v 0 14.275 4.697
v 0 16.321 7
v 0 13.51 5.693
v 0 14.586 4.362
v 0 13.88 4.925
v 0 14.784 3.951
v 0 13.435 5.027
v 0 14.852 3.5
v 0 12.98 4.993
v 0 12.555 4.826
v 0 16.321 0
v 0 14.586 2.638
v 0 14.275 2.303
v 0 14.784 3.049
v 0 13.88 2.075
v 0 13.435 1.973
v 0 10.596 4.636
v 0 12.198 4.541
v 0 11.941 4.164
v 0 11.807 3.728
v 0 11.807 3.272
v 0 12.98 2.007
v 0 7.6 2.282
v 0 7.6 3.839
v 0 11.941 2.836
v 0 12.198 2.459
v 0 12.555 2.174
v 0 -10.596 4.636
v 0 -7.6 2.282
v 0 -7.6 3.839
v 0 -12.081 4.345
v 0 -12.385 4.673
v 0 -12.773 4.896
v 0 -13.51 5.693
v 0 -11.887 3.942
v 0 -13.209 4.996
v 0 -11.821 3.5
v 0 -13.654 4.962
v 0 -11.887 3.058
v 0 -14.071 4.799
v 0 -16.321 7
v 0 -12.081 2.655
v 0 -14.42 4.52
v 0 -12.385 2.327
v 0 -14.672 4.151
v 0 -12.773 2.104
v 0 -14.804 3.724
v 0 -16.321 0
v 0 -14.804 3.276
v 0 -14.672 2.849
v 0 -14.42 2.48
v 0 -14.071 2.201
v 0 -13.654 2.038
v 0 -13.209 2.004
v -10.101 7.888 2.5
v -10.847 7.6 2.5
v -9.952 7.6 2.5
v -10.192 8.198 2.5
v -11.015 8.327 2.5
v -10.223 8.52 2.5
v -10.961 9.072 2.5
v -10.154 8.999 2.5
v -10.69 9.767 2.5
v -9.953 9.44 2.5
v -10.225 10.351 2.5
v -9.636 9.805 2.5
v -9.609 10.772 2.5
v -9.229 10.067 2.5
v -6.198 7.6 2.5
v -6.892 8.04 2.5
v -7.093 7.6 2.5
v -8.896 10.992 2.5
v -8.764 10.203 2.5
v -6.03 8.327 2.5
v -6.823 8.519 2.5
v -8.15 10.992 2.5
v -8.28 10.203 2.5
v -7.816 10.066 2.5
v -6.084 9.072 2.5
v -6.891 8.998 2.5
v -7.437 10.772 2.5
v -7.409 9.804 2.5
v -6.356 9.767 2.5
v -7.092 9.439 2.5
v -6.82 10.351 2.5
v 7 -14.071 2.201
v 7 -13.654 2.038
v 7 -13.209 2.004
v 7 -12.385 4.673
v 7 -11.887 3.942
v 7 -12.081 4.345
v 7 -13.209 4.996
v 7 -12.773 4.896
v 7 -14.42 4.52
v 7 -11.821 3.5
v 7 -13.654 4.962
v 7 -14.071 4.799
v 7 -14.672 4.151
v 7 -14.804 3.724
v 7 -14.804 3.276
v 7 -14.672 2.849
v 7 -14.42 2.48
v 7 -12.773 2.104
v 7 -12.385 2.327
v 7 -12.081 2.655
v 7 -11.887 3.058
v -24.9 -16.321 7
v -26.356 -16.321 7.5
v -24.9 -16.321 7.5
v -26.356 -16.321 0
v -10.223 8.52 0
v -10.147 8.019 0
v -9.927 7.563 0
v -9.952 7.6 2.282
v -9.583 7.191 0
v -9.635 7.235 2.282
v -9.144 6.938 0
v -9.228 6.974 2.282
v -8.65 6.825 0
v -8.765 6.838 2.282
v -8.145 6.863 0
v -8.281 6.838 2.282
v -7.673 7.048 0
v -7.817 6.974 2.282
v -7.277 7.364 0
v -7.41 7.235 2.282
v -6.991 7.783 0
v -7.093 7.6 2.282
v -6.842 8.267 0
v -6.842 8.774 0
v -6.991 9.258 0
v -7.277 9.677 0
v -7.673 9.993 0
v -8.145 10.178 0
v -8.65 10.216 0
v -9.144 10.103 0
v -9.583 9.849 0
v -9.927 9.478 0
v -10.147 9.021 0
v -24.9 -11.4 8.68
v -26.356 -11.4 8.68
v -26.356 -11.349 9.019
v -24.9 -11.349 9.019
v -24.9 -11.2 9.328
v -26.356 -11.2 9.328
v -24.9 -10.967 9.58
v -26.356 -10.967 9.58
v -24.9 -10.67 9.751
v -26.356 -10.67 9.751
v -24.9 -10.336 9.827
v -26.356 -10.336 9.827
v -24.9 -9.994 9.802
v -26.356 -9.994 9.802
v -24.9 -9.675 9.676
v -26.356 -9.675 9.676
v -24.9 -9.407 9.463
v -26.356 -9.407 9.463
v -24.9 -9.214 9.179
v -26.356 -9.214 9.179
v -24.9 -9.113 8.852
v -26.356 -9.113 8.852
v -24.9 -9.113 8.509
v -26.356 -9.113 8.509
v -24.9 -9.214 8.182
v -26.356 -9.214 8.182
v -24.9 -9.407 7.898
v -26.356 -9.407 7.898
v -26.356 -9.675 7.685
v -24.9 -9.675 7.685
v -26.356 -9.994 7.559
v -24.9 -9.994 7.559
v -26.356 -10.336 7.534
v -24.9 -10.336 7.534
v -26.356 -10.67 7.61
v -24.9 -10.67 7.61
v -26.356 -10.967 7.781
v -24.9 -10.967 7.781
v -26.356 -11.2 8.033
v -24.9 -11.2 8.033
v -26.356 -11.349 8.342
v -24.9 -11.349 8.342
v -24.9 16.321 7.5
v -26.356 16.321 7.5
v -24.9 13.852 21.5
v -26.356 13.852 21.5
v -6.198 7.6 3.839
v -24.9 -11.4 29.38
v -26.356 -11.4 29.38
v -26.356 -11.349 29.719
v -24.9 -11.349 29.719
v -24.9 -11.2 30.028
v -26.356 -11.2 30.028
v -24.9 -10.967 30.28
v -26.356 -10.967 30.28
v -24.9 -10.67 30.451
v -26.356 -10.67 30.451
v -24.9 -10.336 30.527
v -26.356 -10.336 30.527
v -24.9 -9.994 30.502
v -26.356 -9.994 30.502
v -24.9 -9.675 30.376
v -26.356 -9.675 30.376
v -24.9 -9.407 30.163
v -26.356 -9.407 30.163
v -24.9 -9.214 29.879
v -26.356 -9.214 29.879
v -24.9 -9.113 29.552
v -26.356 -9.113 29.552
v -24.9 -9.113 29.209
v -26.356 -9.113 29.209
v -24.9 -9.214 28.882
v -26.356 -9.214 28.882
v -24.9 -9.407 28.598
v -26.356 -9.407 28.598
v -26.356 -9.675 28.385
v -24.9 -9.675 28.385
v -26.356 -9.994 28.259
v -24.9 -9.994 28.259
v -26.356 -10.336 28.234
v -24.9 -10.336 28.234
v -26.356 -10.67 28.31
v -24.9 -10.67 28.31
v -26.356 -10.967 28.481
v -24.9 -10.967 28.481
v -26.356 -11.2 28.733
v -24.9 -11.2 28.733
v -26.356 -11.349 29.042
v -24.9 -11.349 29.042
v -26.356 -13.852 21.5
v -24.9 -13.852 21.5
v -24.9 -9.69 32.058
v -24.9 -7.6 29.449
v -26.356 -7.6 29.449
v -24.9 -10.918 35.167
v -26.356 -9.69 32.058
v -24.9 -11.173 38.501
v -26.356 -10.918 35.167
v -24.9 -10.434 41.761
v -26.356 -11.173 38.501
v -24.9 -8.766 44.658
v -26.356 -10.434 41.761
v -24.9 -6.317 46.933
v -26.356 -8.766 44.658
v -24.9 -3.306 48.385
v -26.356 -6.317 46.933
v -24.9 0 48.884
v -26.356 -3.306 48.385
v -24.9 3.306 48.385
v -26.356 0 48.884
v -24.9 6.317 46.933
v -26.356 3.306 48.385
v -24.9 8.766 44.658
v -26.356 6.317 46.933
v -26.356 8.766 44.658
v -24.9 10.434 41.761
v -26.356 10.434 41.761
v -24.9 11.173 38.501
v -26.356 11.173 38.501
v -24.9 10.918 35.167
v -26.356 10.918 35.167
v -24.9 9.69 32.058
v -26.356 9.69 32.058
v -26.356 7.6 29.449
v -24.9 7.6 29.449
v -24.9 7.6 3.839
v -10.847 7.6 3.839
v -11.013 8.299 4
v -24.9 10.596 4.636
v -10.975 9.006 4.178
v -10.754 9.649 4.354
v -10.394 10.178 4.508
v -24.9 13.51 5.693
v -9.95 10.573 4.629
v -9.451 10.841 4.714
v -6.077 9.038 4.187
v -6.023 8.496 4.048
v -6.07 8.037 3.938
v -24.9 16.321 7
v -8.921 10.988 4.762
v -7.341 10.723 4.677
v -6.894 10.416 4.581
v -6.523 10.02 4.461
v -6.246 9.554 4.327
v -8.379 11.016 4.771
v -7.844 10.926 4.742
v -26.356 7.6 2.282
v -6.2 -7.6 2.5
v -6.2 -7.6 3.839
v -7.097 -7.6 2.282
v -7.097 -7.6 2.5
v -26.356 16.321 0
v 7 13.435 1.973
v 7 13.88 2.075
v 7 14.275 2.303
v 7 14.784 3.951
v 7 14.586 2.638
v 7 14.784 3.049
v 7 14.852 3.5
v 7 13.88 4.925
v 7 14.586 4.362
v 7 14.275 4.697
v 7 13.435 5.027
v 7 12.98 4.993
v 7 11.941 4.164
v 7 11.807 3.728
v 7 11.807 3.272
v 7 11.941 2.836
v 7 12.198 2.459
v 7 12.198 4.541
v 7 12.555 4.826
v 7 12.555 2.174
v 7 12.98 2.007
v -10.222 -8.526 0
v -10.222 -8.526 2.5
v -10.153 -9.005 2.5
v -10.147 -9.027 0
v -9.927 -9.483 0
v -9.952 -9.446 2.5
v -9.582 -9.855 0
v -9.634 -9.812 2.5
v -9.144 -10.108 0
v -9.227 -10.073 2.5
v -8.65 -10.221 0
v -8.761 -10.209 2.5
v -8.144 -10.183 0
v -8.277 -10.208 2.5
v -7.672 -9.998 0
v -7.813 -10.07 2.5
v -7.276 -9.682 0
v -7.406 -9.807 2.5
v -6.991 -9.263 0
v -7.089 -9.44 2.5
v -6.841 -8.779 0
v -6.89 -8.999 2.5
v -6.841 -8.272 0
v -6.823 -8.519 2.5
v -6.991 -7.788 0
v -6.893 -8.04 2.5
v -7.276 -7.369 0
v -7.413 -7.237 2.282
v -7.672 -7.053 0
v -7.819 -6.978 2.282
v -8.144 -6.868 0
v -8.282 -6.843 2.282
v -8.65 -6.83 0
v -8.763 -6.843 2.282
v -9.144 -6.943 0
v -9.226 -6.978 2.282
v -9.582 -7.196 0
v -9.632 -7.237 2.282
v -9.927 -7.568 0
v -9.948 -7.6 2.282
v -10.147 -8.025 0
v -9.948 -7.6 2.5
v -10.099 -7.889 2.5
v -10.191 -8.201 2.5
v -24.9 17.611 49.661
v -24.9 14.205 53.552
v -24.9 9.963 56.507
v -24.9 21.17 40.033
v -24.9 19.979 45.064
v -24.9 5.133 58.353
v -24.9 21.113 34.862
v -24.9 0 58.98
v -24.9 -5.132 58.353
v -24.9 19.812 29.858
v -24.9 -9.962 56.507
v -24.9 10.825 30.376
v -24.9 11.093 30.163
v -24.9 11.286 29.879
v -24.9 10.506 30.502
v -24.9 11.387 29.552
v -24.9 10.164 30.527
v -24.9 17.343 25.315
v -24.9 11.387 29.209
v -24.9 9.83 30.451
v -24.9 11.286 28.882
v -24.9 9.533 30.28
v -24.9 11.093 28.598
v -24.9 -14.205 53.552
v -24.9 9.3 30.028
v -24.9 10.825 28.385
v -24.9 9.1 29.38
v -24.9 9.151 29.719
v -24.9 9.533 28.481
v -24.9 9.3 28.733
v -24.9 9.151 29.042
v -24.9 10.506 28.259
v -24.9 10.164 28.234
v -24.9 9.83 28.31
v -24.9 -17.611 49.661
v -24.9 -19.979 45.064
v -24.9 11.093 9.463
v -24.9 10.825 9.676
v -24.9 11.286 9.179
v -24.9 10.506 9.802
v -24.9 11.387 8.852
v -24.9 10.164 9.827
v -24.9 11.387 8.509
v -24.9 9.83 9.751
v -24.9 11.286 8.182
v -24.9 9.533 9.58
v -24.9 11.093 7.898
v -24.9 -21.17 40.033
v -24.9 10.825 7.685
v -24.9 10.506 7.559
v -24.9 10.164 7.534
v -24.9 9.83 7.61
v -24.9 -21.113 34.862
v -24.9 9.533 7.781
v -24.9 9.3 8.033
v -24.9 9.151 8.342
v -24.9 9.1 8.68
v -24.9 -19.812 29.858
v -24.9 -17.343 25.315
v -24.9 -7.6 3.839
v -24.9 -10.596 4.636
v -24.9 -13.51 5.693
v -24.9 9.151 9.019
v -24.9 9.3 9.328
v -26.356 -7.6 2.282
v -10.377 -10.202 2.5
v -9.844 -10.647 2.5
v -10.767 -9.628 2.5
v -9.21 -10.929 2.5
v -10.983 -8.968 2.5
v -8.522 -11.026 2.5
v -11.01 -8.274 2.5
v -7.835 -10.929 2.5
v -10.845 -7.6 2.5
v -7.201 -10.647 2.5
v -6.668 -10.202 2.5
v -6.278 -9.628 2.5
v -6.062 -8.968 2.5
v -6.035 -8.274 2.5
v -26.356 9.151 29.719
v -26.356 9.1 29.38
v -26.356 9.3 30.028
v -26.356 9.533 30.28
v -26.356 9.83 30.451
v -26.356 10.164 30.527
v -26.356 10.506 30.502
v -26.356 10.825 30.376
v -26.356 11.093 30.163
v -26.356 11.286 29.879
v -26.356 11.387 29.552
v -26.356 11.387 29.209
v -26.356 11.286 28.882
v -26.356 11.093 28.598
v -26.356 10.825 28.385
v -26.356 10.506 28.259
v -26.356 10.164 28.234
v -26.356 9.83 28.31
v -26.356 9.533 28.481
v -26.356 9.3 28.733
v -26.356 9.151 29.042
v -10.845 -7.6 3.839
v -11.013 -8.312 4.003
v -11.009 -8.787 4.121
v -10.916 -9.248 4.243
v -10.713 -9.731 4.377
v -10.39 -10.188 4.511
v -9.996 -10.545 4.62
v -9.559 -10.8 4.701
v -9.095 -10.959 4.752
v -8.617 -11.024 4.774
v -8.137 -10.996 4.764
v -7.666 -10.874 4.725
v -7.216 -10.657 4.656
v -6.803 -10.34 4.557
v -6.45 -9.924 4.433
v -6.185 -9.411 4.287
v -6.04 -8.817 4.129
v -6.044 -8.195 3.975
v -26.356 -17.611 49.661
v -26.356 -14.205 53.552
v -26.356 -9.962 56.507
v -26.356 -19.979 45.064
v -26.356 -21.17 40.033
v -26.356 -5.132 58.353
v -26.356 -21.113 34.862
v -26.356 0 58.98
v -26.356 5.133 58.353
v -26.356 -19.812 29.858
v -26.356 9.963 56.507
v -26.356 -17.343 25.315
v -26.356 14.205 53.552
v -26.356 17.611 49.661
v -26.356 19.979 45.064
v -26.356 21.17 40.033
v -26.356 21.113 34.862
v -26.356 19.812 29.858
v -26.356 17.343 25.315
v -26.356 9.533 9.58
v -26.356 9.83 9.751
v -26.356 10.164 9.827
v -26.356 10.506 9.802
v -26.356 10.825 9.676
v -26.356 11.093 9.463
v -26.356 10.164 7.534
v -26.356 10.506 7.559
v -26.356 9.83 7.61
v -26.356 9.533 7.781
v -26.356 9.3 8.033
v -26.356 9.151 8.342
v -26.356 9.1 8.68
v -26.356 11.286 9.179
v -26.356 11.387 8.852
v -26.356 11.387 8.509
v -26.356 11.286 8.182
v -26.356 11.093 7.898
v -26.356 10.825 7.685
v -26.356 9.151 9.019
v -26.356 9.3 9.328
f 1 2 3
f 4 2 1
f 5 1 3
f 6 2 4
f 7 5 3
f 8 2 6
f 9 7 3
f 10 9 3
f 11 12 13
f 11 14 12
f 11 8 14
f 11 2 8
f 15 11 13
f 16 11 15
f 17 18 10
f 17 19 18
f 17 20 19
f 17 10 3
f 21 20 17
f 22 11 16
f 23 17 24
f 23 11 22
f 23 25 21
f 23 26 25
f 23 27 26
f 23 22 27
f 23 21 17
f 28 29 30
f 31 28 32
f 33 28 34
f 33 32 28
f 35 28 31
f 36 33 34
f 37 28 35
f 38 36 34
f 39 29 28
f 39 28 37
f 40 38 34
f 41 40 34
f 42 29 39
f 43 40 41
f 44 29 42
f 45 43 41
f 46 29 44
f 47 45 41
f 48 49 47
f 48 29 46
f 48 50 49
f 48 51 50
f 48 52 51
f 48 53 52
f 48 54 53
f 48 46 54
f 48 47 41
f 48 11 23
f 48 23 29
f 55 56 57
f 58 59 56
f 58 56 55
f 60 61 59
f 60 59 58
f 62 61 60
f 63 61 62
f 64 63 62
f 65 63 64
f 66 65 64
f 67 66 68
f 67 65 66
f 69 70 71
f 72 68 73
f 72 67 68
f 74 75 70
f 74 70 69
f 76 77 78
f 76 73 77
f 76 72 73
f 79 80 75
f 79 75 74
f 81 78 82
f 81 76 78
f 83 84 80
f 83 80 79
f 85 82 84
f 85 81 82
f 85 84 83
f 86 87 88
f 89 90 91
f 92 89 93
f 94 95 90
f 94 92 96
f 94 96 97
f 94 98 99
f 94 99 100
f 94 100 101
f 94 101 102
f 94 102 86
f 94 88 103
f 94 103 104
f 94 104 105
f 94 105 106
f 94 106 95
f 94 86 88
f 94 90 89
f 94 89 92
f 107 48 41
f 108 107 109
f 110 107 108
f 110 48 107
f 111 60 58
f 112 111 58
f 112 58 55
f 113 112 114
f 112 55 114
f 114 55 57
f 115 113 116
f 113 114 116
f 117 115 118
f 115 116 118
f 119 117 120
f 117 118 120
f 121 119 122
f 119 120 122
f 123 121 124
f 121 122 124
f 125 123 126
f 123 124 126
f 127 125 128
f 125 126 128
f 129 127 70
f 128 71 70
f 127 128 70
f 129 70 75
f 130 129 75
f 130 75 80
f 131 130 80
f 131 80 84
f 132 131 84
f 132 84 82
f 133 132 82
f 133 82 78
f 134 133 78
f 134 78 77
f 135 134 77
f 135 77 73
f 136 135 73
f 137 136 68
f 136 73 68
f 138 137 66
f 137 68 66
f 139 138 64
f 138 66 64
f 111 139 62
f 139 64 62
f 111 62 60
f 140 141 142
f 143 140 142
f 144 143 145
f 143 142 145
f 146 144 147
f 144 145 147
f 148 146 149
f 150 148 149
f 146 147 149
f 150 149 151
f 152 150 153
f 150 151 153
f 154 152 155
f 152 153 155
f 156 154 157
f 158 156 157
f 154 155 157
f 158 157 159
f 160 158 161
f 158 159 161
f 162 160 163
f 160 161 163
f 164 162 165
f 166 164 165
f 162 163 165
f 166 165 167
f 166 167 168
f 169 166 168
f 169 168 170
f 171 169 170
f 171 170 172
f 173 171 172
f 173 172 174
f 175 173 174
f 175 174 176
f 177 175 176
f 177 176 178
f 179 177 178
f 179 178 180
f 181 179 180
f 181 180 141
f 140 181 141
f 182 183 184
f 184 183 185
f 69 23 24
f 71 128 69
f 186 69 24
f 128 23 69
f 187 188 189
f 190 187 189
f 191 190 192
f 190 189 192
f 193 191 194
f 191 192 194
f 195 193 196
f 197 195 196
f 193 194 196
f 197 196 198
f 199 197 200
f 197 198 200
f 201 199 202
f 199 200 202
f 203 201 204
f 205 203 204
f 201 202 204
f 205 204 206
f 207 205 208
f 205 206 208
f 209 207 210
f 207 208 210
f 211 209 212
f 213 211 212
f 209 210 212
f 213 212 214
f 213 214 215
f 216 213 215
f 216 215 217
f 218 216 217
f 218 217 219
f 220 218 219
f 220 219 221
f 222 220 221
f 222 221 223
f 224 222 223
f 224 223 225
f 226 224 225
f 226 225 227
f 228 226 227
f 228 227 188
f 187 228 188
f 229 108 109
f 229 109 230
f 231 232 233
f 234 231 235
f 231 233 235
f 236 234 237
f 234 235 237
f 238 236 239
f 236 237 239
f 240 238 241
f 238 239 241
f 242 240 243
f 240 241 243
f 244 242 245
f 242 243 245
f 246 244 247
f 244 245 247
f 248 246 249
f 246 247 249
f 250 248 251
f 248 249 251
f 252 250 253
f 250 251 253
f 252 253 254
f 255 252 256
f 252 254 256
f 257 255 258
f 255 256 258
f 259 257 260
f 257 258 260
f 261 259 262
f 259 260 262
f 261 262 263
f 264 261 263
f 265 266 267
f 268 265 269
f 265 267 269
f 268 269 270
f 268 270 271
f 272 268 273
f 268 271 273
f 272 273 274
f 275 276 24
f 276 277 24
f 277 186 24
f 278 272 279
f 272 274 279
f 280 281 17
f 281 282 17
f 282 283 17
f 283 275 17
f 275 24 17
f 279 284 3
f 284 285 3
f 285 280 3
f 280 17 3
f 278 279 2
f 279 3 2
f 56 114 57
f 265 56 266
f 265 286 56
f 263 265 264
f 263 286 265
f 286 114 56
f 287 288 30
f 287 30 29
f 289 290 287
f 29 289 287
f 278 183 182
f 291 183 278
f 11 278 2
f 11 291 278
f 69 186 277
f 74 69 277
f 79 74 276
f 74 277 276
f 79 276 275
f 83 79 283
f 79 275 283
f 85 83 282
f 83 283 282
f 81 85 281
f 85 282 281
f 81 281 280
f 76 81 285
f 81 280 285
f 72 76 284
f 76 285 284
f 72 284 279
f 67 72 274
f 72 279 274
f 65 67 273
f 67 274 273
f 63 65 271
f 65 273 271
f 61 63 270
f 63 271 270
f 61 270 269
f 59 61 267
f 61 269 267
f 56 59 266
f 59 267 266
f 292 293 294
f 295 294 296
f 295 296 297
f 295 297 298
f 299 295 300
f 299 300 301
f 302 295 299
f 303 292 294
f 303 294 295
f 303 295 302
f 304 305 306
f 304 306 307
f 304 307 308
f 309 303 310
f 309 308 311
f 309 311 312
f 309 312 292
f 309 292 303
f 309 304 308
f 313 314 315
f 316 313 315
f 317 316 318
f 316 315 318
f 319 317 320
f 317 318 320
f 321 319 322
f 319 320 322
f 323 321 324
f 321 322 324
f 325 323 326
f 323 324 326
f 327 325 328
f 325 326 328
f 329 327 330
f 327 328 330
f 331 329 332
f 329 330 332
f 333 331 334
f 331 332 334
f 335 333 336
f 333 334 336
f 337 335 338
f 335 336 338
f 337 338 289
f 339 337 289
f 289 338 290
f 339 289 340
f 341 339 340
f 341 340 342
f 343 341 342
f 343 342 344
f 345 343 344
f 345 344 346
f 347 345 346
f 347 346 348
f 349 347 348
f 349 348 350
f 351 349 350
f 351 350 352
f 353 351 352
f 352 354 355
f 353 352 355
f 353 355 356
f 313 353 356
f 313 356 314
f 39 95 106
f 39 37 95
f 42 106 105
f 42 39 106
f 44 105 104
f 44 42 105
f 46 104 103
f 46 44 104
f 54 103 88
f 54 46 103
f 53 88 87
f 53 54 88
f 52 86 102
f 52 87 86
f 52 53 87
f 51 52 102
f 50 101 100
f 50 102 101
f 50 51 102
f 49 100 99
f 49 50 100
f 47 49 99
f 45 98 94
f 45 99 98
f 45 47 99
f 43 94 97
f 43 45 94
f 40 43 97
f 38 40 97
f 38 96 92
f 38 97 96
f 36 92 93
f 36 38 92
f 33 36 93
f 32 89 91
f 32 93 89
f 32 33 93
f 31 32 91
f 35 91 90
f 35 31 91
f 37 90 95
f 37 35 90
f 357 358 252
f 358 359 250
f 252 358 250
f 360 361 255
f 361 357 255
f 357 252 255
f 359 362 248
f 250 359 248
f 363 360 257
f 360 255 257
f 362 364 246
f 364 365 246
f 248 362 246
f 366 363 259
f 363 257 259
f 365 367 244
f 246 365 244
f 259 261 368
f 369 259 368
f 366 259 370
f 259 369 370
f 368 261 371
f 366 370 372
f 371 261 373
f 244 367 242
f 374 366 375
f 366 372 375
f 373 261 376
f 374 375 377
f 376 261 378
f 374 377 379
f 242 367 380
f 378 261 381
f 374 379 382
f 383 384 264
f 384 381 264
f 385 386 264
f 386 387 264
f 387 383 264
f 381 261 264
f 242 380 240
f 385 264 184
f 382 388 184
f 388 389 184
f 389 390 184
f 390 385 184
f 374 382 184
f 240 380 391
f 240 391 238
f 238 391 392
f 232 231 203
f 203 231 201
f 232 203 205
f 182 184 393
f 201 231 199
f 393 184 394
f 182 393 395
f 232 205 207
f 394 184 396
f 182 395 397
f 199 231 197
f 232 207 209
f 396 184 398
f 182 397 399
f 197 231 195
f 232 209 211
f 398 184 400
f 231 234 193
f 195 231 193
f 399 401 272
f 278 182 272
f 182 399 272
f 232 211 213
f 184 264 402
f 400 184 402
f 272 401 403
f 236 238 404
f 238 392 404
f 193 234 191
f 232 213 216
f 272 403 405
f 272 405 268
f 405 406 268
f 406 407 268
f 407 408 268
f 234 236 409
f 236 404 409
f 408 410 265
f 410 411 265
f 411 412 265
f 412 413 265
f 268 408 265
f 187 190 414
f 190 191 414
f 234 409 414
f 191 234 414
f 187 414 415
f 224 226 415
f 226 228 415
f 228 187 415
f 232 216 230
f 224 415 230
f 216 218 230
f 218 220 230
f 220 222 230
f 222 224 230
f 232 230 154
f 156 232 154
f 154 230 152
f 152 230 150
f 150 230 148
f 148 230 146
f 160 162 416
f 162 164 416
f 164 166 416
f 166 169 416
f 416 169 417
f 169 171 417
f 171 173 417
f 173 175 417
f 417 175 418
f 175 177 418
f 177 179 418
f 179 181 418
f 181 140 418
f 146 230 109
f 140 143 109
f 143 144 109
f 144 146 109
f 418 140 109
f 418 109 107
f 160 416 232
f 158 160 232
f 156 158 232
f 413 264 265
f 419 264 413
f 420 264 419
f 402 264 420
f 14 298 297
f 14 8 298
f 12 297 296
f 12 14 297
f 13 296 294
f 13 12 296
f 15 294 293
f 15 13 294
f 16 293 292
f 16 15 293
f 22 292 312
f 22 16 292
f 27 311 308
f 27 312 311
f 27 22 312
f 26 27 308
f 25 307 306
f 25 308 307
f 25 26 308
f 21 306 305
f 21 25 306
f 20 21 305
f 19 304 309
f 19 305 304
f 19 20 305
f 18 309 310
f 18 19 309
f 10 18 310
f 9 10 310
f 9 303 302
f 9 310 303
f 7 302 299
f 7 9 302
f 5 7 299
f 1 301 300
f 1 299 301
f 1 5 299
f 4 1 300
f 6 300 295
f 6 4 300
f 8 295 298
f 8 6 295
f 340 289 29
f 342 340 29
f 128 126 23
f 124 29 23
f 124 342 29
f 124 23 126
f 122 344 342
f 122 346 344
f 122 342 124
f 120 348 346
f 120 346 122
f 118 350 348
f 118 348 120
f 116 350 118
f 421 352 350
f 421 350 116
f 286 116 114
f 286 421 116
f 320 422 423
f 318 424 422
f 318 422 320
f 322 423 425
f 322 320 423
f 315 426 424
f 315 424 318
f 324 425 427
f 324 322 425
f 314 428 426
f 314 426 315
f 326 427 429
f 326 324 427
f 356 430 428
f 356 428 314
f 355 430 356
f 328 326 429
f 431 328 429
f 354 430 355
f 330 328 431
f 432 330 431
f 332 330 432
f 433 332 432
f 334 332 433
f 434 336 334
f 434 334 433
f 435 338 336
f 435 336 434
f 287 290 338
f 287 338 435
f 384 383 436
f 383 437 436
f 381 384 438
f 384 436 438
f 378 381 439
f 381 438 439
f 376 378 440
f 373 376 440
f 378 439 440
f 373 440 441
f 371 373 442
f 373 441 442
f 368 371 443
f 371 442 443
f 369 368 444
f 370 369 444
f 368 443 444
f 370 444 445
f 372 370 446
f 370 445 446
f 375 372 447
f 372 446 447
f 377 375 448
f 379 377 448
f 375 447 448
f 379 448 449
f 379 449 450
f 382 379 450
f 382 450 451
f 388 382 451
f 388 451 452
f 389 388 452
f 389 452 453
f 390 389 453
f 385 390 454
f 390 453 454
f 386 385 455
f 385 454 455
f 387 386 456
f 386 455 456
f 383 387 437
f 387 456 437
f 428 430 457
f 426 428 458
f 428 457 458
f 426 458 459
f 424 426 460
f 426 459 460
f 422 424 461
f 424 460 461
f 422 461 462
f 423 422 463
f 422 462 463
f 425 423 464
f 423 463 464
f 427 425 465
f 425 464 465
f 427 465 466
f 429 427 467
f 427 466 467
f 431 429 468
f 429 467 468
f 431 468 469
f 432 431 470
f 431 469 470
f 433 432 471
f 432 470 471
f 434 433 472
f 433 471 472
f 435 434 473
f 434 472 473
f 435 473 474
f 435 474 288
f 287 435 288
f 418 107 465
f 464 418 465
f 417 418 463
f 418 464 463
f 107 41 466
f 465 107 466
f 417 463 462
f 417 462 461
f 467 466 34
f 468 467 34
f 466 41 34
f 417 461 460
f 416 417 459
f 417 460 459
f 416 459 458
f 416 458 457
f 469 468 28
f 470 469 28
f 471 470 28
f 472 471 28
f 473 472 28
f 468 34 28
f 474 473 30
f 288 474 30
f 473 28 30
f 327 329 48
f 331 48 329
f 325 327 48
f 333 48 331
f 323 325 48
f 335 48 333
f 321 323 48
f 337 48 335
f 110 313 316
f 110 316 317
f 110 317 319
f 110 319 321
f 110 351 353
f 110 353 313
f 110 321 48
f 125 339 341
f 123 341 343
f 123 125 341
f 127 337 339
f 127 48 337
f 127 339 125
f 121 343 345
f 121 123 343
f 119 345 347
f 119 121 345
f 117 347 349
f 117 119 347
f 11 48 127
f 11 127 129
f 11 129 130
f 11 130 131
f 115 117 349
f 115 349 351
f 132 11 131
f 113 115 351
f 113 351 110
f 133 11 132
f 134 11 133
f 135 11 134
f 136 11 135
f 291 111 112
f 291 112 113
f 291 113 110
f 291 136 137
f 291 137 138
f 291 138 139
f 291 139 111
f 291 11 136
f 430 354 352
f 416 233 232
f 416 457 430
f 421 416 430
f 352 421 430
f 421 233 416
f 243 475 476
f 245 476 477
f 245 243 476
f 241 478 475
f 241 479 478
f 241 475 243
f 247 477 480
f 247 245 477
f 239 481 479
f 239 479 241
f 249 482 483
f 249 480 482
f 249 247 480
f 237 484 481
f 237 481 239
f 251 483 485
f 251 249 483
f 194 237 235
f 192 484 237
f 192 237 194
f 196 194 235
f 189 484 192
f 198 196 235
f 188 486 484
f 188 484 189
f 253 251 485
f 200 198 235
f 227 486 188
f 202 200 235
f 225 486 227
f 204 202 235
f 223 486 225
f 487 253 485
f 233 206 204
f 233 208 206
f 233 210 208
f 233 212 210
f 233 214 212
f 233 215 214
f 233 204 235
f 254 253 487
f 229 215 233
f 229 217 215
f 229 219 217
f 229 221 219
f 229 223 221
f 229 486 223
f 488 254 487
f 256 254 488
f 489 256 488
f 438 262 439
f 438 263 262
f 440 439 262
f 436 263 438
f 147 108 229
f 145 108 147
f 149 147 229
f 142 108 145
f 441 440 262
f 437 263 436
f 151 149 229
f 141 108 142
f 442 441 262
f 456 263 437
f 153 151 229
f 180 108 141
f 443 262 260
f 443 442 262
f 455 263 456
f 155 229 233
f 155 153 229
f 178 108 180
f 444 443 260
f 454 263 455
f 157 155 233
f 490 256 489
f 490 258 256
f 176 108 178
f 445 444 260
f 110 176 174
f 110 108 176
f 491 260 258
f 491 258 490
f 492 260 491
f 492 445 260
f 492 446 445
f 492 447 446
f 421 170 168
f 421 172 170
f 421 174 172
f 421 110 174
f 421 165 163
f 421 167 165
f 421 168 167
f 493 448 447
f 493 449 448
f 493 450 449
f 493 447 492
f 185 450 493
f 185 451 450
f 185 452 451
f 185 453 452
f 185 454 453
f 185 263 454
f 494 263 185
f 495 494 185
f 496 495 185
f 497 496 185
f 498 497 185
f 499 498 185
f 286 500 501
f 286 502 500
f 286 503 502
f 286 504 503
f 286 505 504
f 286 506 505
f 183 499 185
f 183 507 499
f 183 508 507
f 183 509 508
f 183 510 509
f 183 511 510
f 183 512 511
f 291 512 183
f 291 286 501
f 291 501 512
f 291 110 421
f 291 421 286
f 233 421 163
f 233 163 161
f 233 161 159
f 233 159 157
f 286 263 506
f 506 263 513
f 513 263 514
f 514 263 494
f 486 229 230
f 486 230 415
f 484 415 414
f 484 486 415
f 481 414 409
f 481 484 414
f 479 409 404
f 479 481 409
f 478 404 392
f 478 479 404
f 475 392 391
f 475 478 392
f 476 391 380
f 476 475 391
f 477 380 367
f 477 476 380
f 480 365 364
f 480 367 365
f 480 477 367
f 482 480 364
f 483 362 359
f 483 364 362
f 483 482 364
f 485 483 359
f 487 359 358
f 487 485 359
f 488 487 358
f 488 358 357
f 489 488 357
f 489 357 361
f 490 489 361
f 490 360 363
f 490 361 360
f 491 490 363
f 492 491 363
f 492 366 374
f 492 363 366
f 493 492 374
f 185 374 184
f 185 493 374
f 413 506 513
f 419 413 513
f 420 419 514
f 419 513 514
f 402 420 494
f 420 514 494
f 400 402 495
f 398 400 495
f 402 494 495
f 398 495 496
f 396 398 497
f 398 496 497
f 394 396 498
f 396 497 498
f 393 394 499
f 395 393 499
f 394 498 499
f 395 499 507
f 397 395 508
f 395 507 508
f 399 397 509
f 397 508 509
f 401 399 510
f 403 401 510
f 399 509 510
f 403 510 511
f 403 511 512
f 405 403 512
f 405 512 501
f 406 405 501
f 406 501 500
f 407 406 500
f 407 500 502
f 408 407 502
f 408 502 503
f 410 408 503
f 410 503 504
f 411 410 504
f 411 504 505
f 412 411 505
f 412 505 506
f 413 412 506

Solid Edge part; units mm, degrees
sketch "Sketch1" plane through (0, 0, 0) normal (0, 0, 1) x (1, 0, 0)
  line L0 (-26.3559, 16.3207) -> (0, 16.3207)
  line L1 (0, 16.3207) -> (0, -16.3207)
  line L2 (0, -16.3207) -> (-26.3559, -16.3207)
  line L3 (-26.3559, -16.3207) -> (-26.3559, 16.3207)
extrude "Protrusion1" add sketch "Sketch1" along normal up to vertex (7.5 mm away)
sketch "Sketch2" plane through (0.0003, -13.7602, 7.5) normal (0, 0, 1) x (-1, 0, 0)
  circle A0 centre (8.5228, -5.2346) radius 1.7
  circle A1 centre (8.5231, -22.2805) radius 1.7
extrude "Cutout1" cut sketch "Sketch2" against normal up to next
sketch "Sketch3" plane through (0.0003, -13.7602, 7.5) normal (0, 0, 1) x (0, 1, 0)
  circle A0 centre (5.2346, 8.5228) radius 2.5
  circle A1 centre (22.2805, 8.5231) radius 2.5
extrude "Cutout2" cut sketch "Sketch3" against normal blind 5
sketch "Sketch4" plane through (0, 0, 3.5) normal (1, 0, 0) x (0, 1, 0)
  line L0 (-16.3207, 4) -> (16.3207, 4)
  line L1 (16.3207, 4) -> (16.3207, 3.5)
  arc A0 (-16.3207, 3.5) -> (16.3207, 3.5) centre (0, 34.9133) ccw
  line L2 (-16.3207, 4) -> (-16.3207, 3.5)
extrude "Cutout3" cut sketch "Sketch4" against normal blind 24.9
sketch "Sketch5" plane through (0, 0, 3.5) normal (1, 0, 0) x (0, 1, 0)
  circle A0 centre (-13.3207, 0) radius 1.5
  circle A1 centre (13.3207, 0) radius 1.531
extrude "Protrusion2" add sketch "Sketch5" along normal blind 7
sketch "Sketch6" plane through (-26.3559, -27.5204, 3.5) normal (-1, 0, 0) x (0, 0, 1)
  line L0 (4, 43.8411) -> (18, 41.3725)
  arc A0 (18, 41.3725) -> (18, 13.6682) centre (34.1805, 27.5204) cw
  line L1 (4, 11.1997) -> (18, 13.6682)
  line L2 (-3.5, 11.1997) -> (4, 11.1997)
  line L3 (-3.5, 43.8411) -> (-3.5, 11.1997)
  line L4 (4, 43.8411) -> (-3.5, 43.8411)
extrude "Protrusion3" add sketch "Sketch6" against normal up to vertex (1.4559 mm away)
sketch "Sketch7" plane through (-26.3559, -27.5204, 30.1014) normal (-1, 0, 0) x (0, -1, 0)
  circle A0 centre (-17.2704, -0.7209) radius 1.15
  circle A1 centre (-17.2704, -21.4209) radius 1.15
  circle A2 centre (-37.7704, -21.4209) radius 1.15
  circle A3 centre (-37.7704, -0.7209) radius 1.15
  arc A4 (-35.1204, -0.6522) -> (-19.9204, -0.6522) centre (-27.5204, 7.5791) cw
  line L0 (-19.9204, -0.6522) -> (-19.9204, -27.819)
  line L1 (-19.9204, -27.819) -> (-35.1204, -27.819)
  line L2 (-35.1204, -27.819) -> (-35.1204, -0.6522)
  dimension "D1" = 0.6
extrude "Cutout4" cut sketch "Sketch7" against normal up to next
